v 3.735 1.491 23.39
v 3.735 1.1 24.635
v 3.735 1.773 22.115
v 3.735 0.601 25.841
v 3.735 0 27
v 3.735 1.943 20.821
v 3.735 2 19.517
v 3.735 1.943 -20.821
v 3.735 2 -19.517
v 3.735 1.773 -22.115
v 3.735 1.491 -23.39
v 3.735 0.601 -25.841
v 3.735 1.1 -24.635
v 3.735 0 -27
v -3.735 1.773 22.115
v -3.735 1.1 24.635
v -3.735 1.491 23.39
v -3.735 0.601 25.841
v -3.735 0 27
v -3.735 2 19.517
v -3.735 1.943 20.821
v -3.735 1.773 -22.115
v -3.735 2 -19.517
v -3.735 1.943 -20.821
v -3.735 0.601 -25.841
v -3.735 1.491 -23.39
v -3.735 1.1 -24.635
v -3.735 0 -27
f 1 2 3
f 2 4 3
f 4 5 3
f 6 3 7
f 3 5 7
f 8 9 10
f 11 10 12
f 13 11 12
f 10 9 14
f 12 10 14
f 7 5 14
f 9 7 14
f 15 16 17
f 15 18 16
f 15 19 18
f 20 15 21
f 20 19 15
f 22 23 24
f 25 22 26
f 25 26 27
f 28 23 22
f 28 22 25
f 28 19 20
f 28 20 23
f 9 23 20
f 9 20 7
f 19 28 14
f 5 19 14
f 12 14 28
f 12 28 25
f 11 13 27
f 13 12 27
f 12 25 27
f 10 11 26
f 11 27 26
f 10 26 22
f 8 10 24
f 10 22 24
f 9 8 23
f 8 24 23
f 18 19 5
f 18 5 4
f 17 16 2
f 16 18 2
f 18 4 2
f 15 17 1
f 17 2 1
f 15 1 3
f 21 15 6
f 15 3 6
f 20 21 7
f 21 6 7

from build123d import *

# Parameters (mm, degrees)
SKETCH_1_W      = 7.47
SKETCH_1_H      = 54
EXTRUDE_1_DEPTH = 2
FILLET_1_R      = 15
FILLET_2_R      = 15


with BuildPart() as part:
    # Эскиз1 → Бобышка-Вытянуть1 (new body)
    with BuildSketch(Plane(origin=(0, 0, 0), x_dir=(1, 0, 0), z_dir=(0, 1, 0))):
        Rectangle(SKETCH_1_W, SKETCH_1_H)
    extrude(amount=EXTRUDE_1_DEPTH)

    # Скругление1
    # the kernel refuses this fillet: 15 mm, written as the material it takes off along each edge
    with BuildSketch(Plane(origin=(22.443286934, 2, 27), x_dir=(0, -1, 0), z_dir=(-1, 0, 0))) as fillet_1_piece_1:
        with BuildLine():
            CenterArc((15, -7.483314774), FILLET_1_R, 150.073565133, 29.926434867)
            Line((0, -7.483314774), (-0.3, -7.483314774))
            Line((-0.3, -7.483314774), (-0.3, 0))
            Line((-0.3, 0), (0, 0.3))
            ThreePointArc((0, 0.3), (1, 0.3), (1.74, 0.149666295))
            Line((1.74, 0.149666295), (2, 0))
        make_face()
    extrude(amount=44.886573868, mode=Mode.SUBTRACT)

    # Скругление2
    # the kernel refuses this fillet: 15 mm, written as the material it takes off along each edge
    with BuildSketch(Plane(origin=(-22.443286934, 2, -27), x_dir=(0, -1, 0), z_dir=(1, 0, 0))) as fillet_2_piece_1:
        with BuildLine():
            CenterArc((15, -7.483314774), FILLET_2_R, 150.073565133, 29.926434867)
            Line((0, -7.483314774), (-0.3, -7.483314774))
            Line((-0.3, -7.483314774), (-0.3, 0))
            Line((-0.3, 0), (0, 0.3))
            ThreePointArc((0, 0.3), (1, 0.3), (1.74, 0.149666295))
            Line((1.74, 0.149666295), (2, 0))
        make_face()
    extrude(amount=44.886573868, mode=Mode.SUBTRACT)


solid = part.part
